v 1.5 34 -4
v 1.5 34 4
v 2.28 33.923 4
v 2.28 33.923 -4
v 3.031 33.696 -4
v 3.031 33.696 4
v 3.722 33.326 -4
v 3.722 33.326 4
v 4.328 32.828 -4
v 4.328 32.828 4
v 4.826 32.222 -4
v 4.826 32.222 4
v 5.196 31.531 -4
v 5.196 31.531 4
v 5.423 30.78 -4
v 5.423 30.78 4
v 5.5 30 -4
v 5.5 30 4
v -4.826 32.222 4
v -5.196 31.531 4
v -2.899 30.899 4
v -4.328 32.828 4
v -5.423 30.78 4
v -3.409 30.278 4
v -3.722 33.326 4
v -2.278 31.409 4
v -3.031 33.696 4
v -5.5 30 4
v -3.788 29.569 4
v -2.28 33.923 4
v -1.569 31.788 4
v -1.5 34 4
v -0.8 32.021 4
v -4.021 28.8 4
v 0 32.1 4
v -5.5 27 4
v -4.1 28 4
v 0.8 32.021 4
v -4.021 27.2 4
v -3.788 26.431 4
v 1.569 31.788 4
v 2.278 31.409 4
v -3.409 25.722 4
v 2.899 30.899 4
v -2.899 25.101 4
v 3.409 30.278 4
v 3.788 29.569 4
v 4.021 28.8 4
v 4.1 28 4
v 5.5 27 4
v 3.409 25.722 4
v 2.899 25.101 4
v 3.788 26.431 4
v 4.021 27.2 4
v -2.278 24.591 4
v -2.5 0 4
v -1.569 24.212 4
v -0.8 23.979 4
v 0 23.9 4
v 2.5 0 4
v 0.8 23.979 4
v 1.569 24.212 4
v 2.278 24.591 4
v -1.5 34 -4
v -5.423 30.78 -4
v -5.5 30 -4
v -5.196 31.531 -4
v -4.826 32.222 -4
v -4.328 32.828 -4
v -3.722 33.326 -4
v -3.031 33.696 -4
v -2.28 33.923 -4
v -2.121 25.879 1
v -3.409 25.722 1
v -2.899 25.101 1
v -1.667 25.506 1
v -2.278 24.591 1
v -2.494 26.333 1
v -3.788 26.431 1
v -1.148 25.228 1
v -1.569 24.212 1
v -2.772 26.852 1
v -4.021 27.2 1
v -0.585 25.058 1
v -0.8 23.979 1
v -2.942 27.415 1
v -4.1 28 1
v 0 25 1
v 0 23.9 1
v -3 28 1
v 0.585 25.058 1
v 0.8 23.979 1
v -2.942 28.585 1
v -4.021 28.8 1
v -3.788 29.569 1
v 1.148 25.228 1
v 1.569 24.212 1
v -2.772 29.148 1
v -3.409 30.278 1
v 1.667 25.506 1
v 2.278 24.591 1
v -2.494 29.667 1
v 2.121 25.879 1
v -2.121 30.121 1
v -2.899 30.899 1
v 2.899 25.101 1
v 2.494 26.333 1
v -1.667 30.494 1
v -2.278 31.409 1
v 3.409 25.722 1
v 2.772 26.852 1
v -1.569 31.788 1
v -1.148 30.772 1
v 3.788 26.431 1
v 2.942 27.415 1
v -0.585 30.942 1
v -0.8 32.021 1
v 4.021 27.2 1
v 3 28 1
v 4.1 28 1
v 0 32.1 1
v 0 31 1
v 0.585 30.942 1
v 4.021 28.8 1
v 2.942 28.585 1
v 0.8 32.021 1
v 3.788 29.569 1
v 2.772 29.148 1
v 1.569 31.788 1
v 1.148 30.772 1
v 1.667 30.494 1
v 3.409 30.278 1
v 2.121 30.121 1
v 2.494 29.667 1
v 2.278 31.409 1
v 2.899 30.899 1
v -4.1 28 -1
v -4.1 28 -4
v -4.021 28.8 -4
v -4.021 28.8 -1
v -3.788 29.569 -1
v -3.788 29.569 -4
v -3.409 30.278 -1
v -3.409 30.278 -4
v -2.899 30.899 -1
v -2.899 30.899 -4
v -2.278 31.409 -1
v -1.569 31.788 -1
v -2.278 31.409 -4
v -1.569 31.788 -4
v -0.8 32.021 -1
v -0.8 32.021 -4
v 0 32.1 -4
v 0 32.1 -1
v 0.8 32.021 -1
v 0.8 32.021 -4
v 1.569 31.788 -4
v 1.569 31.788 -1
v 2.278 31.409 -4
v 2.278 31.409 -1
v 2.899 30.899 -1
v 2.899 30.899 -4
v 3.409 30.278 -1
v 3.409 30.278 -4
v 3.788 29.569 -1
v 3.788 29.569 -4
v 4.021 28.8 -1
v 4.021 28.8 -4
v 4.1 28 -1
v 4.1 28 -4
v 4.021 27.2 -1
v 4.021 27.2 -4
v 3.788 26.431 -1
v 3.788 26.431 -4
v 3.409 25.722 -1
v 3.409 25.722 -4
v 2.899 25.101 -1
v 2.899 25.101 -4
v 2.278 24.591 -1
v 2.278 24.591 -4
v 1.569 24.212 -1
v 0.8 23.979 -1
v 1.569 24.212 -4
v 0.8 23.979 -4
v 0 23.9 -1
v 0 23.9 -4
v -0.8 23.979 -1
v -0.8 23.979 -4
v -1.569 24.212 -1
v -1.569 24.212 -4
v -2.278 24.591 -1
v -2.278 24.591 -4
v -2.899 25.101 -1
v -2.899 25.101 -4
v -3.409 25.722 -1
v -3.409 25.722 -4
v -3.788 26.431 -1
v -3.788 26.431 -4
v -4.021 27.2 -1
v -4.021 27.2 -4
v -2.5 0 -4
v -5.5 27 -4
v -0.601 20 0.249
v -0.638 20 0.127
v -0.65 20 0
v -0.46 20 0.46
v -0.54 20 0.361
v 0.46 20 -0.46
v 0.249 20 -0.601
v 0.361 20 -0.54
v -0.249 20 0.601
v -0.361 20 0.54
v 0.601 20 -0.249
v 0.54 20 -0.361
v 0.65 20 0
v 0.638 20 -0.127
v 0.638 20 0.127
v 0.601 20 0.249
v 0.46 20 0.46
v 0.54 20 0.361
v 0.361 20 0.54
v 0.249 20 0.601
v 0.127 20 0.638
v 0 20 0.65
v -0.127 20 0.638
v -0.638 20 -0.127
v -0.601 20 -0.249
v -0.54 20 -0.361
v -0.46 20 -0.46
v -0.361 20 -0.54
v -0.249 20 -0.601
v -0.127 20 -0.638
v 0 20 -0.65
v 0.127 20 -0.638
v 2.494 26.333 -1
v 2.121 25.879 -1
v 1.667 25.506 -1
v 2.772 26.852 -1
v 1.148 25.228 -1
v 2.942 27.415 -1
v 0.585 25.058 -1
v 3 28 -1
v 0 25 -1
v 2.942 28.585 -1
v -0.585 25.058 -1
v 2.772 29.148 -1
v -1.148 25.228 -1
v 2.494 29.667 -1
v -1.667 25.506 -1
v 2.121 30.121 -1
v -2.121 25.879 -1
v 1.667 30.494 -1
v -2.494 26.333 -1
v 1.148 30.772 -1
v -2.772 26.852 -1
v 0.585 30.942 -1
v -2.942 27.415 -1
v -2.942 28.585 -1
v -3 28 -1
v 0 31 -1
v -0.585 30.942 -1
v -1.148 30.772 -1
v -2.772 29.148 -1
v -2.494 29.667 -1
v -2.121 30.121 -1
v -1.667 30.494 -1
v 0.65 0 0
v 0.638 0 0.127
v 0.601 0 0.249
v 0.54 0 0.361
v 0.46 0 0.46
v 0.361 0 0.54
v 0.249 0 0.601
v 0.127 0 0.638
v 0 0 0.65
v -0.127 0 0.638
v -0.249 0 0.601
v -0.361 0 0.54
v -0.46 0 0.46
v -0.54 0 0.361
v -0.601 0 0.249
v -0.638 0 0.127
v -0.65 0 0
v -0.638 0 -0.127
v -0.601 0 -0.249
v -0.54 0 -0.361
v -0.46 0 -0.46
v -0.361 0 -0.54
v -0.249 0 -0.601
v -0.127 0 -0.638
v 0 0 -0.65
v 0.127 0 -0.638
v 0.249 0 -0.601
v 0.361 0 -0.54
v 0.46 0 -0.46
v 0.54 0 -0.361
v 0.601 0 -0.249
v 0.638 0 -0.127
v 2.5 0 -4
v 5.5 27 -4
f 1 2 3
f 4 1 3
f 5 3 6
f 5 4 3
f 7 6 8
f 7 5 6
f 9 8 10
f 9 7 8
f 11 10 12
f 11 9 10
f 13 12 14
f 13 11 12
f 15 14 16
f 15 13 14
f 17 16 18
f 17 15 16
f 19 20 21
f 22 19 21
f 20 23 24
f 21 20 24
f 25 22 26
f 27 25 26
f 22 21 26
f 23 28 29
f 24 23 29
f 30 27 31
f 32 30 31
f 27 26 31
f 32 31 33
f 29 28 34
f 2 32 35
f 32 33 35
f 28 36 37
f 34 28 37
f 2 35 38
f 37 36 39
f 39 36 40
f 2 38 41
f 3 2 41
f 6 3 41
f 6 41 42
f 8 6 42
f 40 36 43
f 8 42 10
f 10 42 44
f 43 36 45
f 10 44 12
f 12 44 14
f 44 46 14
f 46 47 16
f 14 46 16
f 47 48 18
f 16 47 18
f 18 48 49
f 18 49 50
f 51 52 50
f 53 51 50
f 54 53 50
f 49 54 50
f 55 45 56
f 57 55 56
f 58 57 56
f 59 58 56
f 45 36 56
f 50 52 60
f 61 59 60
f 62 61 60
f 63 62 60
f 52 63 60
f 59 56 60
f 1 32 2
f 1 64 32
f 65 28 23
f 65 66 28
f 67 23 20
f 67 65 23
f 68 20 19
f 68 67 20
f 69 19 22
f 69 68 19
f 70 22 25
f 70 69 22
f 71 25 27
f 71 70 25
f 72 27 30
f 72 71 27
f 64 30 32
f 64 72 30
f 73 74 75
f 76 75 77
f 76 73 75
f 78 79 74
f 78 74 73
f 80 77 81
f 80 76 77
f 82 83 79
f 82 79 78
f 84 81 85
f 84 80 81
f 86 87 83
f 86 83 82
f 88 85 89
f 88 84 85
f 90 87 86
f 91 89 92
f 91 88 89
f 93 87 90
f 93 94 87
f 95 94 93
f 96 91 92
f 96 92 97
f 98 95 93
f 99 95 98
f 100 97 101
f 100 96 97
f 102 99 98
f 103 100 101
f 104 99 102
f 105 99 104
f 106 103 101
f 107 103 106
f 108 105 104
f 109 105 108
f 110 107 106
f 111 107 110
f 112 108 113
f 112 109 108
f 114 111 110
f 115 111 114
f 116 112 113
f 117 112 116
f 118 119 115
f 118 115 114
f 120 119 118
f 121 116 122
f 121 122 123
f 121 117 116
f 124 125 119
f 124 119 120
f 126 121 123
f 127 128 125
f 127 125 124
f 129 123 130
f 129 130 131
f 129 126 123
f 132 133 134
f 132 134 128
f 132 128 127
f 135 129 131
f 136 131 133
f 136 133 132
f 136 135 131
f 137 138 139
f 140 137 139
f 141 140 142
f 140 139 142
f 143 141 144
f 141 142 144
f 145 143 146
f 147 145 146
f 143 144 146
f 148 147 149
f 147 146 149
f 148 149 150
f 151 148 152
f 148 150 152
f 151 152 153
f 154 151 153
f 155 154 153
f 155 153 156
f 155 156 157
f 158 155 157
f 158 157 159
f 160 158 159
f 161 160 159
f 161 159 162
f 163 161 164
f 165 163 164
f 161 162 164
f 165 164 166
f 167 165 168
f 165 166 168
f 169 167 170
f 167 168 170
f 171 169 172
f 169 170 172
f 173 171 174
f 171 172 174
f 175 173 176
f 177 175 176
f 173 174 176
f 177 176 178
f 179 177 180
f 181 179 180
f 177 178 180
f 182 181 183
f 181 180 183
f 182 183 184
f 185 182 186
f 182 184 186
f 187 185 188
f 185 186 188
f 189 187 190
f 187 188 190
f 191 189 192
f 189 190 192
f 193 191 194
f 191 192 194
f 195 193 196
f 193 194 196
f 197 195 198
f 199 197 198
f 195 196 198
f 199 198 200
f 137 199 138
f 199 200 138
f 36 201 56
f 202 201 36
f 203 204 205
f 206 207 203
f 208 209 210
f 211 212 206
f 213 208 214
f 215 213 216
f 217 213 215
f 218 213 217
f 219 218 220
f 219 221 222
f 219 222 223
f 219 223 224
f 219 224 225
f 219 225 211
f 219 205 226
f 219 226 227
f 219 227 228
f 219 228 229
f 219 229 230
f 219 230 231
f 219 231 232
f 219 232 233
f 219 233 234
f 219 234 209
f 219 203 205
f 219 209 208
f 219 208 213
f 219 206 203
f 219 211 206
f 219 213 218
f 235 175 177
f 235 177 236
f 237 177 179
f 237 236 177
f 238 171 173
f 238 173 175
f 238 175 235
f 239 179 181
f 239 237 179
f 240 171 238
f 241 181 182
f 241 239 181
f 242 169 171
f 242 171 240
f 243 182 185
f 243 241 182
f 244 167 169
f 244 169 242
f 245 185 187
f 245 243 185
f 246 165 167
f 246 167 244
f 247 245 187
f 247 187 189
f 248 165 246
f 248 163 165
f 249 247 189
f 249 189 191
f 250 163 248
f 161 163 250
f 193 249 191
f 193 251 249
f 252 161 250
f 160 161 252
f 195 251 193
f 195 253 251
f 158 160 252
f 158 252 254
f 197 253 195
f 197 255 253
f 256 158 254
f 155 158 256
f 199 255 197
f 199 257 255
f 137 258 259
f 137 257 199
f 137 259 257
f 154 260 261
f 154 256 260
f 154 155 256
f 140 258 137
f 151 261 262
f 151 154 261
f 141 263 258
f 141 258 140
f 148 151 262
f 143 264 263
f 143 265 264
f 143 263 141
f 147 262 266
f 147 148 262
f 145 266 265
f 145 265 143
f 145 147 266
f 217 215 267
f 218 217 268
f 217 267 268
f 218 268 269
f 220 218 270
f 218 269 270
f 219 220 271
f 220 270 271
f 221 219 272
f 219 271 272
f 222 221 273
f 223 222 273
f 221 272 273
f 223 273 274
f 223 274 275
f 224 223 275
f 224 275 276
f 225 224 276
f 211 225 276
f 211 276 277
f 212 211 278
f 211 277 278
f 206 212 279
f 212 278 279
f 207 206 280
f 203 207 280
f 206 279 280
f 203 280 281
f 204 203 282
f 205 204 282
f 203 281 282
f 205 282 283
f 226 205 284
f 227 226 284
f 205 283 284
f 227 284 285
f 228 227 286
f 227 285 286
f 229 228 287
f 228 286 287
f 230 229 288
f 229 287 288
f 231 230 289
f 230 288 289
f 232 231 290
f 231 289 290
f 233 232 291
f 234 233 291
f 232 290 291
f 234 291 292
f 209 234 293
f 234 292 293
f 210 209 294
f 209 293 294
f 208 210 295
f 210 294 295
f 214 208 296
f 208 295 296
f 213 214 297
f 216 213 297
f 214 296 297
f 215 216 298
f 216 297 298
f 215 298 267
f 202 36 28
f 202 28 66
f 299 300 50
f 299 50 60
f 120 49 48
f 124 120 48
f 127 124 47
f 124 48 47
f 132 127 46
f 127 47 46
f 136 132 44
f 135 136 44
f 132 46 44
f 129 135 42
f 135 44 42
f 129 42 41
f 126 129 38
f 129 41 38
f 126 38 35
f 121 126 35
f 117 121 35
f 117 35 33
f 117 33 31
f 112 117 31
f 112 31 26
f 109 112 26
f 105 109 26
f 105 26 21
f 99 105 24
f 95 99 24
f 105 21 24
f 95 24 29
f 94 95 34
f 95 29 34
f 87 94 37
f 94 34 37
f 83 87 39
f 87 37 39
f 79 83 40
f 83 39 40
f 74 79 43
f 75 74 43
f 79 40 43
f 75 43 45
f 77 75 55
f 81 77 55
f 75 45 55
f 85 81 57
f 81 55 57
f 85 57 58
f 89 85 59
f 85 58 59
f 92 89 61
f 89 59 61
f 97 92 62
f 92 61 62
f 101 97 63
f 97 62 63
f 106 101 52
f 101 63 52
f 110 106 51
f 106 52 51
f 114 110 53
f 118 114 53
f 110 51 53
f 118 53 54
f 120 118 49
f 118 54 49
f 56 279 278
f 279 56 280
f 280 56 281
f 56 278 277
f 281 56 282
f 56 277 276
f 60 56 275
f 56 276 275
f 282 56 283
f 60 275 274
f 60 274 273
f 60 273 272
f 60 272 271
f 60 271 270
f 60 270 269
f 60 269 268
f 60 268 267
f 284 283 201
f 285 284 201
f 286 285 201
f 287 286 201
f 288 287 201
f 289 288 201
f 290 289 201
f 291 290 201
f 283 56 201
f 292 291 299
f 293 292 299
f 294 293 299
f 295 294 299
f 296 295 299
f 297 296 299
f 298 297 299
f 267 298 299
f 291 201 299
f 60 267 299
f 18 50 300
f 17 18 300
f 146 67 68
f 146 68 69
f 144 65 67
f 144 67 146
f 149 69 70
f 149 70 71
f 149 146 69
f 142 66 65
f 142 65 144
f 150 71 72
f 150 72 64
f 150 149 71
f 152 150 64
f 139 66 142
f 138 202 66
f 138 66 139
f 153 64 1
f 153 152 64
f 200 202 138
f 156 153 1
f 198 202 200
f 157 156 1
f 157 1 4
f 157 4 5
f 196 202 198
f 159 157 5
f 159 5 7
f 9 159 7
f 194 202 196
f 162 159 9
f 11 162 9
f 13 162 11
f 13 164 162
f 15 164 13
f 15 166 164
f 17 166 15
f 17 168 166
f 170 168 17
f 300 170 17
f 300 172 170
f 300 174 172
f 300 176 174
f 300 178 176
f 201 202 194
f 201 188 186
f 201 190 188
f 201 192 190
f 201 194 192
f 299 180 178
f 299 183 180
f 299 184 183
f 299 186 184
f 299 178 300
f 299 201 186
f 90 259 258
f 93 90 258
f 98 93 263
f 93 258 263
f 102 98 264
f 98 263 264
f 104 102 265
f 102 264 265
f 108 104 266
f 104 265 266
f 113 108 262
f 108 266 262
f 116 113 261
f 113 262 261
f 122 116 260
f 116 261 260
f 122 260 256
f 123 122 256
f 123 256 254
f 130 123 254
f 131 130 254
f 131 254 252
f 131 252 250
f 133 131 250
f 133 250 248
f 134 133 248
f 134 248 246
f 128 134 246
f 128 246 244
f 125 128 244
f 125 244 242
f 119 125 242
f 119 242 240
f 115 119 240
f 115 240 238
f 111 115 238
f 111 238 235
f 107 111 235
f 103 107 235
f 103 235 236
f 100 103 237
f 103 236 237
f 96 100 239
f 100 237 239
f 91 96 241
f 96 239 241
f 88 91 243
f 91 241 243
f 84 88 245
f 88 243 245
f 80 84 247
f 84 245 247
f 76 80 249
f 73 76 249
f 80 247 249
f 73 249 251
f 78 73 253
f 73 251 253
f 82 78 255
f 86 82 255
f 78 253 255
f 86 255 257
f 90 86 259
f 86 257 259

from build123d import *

# Parameters (mm, degrees)
SKETCH_1_W          = 11
SKETCH_1_H          = 8
EXTRUDE_1_DEPTH     = 34
SKETCH_2_R          = 4.1
CUT_EXTRUDE_1_DEPTH = 3
SKETCH_4_R          = 3
CUT_EXTRUDE_3_DEPTH = 6
SKETCH_6_OUTSIDE_W  = 20.324
SKETCH_6_OUTSIDE_H  = 43.324
CUT_EXTRUDE_5_DEPTH = 10
FILLET_1_R          = 4
SKETCH_5_R          = 0.65
CUT_EXTRUDE_4_DEPTH = 20
SKETCH_7_R          = 4.1
CUT_EXTRUDE_6_DEPTH = 3


with BuildPart() as part:
    # Эскиз1 → Бобышка-Вытянуть1 (new body)
    with BuildSketch(Plane(origin=(0, 0, 0), x_dir=(1, 0, 0), z_dir=(0, 1, 0))):
        Rectangle(SKETCH_1_W, SKETCH_1_H)
    extrude(amount=EXTRUDE_1_DEPTH)

    # Эскиз2 → Вырез-Вытянуть1 (cut)
    with BuildSketch(Plane(origin=(0, 0, -4), x_dir=(-1, 0, 0), z_dir=(0, 0, -1))):
        with Locations((0, 28)):
            Circle(SKETCH_2_R)
    extrude(amount=-CUT_EXTRUDE_1_DEPTH, mode=Mode.SUBTRACT)

    # Эскиз4 → Вырез-Вытянуть3 (cut, through all)
    with BuildSketch(Plane(origin=(0, 0, -1), x_dir=(-1, 0, 0), z_dir=(0, 0, -1))):
        with Locations((0, 28)):
            Circle(SKETCH_4_R)
    extrude(amount=-CUT_EXTRUDE_3_DEPTH, mode=Mode.SUBTRACT)

    # Эскиз6 outside → Вырез-Вытянуть5 (cut)
    with BuildSketch(Plane(origin=(0, 0, -4), x_dir=(-1, 0, 0), z_dir=(0, 0, -1))):
        with Locations((0, 17)):
            Rectangle(SKETCH_6_OUTSIDE_W, SKETCH_6_OUTSIDE_H)
        Polygon((-5.5, 27), (-2.5, 0), (2.5, 0), (5.5, 27), (5.5, 34), (-5.5, 34), align=None, mode=Mode.SUBTRACT)
    extrude(amount=-CUT_EXTRUDE_5_DEPTH, mode=Mode.SUBTRACT)

    # Скругление1
    fillet_1_edges = [part.edges().sort_by_distance(p)[0] for p in [
        (5.5, 34, 0),
        (-5.5, 34, 0),
    ]]
    fillet(fillet_1_edges, radius=FILLET_1_R)

    # Эскиз5 → Вырез-Вытянуть4 (cut)
    with BuildSketch(Plane.XZ):
        Circle(SKETCH_5_R)
    extrude(amount=-CUT_EXTRUDE_4_DEPTH, mode=Mode.SUBTRACT)

    # Эскиз7 → Вырез-Вытянуть6 (cut)
    with BuildSketch(Plane.XY.offset(4)):
        with Locations((0, 28)):
            Circle(SKETCH_7_R)
    extrude(amount=-CUT_EXTRUDE_6_DEPTH, mode=Mode.SUBTRACT)


solid = part.part
